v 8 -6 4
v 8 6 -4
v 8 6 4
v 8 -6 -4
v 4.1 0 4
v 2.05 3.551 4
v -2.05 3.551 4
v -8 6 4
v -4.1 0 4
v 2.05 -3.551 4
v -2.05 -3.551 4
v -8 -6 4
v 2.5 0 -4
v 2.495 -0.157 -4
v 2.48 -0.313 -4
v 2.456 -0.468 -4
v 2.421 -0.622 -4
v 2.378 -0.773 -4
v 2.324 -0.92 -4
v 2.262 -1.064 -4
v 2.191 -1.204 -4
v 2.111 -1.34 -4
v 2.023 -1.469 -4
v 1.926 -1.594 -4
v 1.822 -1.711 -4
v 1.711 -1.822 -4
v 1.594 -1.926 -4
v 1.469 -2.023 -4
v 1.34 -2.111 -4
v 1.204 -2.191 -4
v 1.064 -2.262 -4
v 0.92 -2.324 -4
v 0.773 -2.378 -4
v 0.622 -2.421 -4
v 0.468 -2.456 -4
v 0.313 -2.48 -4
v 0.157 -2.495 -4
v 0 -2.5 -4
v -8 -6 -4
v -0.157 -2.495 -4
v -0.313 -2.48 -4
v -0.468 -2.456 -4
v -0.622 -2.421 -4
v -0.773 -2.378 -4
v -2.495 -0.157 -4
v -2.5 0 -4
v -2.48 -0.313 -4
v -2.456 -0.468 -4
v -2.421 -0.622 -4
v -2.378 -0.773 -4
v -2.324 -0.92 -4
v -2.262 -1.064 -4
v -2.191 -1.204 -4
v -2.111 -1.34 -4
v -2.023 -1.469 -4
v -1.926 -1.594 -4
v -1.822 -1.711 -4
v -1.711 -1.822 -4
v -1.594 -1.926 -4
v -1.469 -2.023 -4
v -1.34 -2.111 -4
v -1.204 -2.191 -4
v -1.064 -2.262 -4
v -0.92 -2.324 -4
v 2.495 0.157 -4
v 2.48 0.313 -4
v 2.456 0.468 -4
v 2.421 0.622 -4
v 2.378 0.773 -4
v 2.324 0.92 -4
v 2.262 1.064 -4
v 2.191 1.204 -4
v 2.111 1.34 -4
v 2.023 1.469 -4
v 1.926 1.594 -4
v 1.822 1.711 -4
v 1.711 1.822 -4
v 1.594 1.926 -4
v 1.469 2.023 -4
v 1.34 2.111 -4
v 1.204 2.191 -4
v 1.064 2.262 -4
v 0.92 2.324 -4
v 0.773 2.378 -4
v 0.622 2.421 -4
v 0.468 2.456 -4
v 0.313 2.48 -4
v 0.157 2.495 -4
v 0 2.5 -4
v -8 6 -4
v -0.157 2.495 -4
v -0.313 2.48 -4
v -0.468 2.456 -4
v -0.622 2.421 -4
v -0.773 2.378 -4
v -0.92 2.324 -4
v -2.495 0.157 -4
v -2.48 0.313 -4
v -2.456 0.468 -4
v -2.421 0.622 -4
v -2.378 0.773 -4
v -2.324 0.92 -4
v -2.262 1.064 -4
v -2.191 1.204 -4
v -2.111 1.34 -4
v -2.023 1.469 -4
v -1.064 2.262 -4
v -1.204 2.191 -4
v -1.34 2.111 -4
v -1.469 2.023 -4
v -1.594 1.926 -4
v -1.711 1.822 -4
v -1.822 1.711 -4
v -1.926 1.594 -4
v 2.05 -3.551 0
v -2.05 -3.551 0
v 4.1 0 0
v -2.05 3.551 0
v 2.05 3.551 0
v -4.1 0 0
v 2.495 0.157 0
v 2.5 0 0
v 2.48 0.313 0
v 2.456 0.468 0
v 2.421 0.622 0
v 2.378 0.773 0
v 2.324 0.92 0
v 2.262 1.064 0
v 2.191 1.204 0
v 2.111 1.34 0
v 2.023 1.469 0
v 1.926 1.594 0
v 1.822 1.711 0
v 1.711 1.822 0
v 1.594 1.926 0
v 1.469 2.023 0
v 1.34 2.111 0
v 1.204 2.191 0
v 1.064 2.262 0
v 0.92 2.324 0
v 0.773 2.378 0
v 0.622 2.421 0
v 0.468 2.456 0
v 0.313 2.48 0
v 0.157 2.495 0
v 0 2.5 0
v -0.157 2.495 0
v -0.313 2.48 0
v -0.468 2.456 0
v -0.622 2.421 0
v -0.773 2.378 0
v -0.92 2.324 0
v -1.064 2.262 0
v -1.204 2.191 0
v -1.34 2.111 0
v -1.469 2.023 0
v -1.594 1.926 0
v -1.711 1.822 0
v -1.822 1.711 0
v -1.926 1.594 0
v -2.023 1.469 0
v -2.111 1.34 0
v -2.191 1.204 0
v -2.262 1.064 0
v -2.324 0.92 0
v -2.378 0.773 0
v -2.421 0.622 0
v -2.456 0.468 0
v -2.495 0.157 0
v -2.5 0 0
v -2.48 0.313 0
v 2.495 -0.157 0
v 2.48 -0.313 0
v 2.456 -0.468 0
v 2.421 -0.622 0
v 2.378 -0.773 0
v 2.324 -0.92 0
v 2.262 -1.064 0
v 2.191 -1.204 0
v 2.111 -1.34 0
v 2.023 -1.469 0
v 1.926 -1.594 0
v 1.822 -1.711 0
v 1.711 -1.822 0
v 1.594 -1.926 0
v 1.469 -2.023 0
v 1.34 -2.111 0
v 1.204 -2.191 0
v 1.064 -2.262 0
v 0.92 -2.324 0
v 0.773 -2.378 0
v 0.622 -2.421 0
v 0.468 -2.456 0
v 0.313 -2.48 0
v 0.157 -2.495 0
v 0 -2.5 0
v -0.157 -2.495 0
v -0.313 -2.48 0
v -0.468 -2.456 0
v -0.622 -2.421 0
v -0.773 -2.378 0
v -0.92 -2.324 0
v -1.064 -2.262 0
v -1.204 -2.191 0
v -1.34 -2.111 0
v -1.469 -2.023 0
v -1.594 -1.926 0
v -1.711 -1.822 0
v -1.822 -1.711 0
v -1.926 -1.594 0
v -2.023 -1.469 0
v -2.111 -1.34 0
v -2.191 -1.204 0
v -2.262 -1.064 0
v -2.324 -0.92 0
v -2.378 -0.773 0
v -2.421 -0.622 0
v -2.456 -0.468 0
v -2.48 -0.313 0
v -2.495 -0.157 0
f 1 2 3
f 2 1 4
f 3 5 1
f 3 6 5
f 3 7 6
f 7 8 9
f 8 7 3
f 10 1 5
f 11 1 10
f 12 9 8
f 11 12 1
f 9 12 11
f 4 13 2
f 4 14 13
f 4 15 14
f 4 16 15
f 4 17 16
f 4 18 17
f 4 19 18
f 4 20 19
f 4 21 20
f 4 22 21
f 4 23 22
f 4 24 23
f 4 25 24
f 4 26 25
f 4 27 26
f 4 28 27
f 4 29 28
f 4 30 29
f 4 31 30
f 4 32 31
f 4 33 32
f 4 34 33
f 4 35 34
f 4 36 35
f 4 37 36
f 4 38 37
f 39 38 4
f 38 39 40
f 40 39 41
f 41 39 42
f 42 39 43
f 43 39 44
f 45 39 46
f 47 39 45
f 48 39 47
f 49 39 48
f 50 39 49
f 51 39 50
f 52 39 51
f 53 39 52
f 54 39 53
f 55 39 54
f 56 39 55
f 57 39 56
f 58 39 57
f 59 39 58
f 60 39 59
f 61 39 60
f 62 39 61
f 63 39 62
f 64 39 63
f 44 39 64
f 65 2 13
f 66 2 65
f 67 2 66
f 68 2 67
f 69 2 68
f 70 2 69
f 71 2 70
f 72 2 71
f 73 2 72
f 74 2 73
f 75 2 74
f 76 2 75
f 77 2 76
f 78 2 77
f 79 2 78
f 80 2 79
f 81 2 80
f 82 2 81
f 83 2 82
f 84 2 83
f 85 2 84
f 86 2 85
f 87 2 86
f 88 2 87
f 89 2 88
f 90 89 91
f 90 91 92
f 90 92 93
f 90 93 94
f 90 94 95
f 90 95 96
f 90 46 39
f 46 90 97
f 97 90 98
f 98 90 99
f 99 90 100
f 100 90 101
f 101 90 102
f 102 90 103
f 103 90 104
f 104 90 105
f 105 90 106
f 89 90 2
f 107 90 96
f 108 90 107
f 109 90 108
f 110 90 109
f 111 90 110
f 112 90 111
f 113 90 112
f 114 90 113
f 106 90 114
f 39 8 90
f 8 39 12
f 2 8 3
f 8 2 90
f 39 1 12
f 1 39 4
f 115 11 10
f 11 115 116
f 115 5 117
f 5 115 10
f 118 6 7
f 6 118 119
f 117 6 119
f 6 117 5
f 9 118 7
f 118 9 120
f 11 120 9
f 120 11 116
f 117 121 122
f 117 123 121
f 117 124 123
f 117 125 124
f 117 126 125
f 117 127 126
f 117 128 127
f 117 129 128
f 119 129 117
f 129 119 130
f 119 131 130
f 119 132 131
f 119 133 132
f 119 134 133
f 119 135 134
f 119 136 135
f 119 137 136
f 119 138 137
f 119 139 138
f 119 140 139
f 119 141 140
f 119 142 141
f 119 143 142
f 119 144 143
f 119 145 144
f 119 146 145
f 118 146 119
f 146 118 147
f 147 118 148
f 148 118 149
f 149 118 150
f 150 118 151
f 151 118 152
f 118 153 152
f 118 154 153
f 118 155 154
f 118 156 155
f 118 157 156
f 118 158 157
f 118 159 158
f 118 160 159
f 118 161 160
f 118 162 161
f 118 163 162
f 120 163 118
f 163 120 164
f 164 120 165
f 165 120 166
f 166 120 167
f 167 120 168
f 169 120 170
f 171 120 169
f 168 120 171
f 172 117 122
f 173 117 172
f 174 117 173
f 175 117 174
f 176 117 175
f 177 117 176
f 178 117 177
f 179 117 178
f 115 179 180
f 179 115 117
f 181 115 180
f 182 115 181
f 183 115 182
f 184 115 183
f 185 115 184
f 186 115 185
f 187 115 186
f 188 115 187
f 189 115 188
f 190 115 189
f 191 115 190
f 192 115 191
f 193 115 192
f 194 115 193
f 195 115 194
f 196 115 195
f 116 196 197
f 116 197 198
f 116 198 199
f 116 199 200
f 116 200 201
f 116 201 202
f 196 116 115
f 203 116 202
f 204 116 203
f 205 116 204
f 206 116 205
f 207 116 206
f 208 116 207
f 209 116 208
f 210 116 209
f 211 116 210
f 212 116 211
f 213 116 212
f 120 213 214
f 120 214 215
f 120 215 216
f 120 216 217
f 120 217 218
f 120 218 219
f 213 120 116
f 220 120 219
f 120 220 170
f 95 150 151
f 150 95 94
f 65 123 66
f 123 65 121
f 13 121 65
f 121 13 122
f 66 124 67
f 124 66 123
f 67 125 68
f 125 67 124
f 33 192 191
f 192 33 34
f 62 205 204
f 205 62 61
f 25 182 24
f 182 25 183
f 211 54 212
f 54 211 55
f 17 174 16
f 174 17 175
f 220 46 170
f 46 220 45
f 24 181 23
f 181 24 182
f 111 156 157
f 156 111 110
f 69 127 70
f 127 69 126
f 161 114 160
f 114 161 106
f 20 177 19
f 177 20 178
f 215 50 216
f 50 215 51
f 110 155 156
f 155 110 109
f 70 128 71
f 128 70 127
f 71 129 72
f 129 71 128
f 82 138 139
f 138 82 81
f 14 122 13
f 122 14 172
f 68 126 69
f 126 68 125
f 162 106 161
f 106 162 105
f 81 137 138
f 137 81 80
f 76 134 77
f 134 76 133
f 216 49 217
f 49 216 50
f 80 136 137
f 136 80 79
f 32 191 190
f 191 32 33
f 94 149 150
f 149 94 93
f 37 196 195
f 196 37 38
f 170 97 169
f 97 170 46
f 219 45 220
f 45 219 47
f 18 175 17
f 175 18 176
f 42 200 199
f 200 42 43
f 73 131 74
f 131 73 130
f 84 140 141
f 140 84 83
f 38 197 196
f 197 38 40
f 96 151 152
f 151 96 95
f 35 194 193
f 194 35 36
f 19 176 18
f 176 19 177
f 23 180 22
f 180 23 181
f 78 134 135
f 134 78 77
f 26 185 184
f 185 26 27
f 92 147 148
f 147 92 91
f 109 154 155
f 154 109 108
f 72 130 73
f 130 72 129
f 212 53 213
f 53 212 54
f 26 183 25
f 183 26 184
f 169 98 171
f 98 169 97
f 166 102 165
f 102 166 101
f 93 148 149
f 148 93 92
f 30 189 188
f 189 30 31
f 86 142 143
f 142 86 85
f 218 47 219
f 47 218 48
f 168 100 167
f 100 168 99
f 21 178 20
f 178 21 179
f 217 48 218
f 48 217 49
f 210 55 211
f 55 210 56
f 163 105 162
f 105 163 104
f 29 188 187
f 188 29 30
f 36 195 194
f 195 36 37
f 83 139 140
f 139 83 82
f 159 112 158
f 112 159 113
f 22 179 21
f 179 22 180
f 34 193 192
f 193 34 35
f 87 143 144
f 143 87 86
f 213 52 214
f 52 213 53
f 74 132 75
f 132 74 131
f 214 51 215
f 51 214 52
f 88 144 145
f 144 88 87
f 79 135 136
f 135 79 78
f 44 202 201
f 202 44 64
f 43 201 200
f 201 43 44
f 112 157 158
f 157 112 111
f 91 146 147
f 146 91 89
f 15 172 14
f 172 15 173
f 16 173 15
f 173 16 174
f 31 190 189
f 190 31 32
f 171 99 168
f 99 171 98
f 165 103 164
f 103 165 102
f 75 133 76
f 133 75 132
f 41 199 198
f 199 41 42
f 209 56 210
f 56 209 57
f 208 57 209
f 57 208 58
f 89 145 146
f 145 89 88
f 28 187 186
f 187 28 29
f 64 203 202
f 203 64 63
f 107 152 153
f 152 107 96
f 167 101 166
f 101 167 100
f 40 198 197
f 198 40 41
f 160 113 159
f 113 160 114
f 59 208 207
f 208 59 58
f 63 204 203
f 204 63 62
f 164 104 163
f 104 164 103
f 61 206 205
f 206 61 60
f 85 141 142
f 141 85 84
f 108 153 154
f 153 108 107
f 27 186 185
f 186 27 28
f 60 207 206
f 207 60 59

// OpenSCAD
module clip(n) {
    difference() {
        union() {            
            for (i=[0:n-1]) {
                translate([0, 0, 3*i - 0.001]) cylinder(d1 = 10, d2 = 6, h = 3, $fn = 100);
            }  
        }
        translate([0,0,-0.01]) cylinder(d = 4.2, h = 50, $fn = 100);
        translate([0,0,-0.01]) cylinder(d = 4.2, h = 50, $fn = 100);
    }

}

//for (j=[4:10]) {
//    translate([20*(j-4),0,0]) clip(j);
//}

difference() {
    cube([16,12,8], center = true);
    cylinder(d = 8.2, h = 4 + 0.1, $fn = 6);
    cylinder(d = 5, h = 20, $fn = 100, center = true);
}
